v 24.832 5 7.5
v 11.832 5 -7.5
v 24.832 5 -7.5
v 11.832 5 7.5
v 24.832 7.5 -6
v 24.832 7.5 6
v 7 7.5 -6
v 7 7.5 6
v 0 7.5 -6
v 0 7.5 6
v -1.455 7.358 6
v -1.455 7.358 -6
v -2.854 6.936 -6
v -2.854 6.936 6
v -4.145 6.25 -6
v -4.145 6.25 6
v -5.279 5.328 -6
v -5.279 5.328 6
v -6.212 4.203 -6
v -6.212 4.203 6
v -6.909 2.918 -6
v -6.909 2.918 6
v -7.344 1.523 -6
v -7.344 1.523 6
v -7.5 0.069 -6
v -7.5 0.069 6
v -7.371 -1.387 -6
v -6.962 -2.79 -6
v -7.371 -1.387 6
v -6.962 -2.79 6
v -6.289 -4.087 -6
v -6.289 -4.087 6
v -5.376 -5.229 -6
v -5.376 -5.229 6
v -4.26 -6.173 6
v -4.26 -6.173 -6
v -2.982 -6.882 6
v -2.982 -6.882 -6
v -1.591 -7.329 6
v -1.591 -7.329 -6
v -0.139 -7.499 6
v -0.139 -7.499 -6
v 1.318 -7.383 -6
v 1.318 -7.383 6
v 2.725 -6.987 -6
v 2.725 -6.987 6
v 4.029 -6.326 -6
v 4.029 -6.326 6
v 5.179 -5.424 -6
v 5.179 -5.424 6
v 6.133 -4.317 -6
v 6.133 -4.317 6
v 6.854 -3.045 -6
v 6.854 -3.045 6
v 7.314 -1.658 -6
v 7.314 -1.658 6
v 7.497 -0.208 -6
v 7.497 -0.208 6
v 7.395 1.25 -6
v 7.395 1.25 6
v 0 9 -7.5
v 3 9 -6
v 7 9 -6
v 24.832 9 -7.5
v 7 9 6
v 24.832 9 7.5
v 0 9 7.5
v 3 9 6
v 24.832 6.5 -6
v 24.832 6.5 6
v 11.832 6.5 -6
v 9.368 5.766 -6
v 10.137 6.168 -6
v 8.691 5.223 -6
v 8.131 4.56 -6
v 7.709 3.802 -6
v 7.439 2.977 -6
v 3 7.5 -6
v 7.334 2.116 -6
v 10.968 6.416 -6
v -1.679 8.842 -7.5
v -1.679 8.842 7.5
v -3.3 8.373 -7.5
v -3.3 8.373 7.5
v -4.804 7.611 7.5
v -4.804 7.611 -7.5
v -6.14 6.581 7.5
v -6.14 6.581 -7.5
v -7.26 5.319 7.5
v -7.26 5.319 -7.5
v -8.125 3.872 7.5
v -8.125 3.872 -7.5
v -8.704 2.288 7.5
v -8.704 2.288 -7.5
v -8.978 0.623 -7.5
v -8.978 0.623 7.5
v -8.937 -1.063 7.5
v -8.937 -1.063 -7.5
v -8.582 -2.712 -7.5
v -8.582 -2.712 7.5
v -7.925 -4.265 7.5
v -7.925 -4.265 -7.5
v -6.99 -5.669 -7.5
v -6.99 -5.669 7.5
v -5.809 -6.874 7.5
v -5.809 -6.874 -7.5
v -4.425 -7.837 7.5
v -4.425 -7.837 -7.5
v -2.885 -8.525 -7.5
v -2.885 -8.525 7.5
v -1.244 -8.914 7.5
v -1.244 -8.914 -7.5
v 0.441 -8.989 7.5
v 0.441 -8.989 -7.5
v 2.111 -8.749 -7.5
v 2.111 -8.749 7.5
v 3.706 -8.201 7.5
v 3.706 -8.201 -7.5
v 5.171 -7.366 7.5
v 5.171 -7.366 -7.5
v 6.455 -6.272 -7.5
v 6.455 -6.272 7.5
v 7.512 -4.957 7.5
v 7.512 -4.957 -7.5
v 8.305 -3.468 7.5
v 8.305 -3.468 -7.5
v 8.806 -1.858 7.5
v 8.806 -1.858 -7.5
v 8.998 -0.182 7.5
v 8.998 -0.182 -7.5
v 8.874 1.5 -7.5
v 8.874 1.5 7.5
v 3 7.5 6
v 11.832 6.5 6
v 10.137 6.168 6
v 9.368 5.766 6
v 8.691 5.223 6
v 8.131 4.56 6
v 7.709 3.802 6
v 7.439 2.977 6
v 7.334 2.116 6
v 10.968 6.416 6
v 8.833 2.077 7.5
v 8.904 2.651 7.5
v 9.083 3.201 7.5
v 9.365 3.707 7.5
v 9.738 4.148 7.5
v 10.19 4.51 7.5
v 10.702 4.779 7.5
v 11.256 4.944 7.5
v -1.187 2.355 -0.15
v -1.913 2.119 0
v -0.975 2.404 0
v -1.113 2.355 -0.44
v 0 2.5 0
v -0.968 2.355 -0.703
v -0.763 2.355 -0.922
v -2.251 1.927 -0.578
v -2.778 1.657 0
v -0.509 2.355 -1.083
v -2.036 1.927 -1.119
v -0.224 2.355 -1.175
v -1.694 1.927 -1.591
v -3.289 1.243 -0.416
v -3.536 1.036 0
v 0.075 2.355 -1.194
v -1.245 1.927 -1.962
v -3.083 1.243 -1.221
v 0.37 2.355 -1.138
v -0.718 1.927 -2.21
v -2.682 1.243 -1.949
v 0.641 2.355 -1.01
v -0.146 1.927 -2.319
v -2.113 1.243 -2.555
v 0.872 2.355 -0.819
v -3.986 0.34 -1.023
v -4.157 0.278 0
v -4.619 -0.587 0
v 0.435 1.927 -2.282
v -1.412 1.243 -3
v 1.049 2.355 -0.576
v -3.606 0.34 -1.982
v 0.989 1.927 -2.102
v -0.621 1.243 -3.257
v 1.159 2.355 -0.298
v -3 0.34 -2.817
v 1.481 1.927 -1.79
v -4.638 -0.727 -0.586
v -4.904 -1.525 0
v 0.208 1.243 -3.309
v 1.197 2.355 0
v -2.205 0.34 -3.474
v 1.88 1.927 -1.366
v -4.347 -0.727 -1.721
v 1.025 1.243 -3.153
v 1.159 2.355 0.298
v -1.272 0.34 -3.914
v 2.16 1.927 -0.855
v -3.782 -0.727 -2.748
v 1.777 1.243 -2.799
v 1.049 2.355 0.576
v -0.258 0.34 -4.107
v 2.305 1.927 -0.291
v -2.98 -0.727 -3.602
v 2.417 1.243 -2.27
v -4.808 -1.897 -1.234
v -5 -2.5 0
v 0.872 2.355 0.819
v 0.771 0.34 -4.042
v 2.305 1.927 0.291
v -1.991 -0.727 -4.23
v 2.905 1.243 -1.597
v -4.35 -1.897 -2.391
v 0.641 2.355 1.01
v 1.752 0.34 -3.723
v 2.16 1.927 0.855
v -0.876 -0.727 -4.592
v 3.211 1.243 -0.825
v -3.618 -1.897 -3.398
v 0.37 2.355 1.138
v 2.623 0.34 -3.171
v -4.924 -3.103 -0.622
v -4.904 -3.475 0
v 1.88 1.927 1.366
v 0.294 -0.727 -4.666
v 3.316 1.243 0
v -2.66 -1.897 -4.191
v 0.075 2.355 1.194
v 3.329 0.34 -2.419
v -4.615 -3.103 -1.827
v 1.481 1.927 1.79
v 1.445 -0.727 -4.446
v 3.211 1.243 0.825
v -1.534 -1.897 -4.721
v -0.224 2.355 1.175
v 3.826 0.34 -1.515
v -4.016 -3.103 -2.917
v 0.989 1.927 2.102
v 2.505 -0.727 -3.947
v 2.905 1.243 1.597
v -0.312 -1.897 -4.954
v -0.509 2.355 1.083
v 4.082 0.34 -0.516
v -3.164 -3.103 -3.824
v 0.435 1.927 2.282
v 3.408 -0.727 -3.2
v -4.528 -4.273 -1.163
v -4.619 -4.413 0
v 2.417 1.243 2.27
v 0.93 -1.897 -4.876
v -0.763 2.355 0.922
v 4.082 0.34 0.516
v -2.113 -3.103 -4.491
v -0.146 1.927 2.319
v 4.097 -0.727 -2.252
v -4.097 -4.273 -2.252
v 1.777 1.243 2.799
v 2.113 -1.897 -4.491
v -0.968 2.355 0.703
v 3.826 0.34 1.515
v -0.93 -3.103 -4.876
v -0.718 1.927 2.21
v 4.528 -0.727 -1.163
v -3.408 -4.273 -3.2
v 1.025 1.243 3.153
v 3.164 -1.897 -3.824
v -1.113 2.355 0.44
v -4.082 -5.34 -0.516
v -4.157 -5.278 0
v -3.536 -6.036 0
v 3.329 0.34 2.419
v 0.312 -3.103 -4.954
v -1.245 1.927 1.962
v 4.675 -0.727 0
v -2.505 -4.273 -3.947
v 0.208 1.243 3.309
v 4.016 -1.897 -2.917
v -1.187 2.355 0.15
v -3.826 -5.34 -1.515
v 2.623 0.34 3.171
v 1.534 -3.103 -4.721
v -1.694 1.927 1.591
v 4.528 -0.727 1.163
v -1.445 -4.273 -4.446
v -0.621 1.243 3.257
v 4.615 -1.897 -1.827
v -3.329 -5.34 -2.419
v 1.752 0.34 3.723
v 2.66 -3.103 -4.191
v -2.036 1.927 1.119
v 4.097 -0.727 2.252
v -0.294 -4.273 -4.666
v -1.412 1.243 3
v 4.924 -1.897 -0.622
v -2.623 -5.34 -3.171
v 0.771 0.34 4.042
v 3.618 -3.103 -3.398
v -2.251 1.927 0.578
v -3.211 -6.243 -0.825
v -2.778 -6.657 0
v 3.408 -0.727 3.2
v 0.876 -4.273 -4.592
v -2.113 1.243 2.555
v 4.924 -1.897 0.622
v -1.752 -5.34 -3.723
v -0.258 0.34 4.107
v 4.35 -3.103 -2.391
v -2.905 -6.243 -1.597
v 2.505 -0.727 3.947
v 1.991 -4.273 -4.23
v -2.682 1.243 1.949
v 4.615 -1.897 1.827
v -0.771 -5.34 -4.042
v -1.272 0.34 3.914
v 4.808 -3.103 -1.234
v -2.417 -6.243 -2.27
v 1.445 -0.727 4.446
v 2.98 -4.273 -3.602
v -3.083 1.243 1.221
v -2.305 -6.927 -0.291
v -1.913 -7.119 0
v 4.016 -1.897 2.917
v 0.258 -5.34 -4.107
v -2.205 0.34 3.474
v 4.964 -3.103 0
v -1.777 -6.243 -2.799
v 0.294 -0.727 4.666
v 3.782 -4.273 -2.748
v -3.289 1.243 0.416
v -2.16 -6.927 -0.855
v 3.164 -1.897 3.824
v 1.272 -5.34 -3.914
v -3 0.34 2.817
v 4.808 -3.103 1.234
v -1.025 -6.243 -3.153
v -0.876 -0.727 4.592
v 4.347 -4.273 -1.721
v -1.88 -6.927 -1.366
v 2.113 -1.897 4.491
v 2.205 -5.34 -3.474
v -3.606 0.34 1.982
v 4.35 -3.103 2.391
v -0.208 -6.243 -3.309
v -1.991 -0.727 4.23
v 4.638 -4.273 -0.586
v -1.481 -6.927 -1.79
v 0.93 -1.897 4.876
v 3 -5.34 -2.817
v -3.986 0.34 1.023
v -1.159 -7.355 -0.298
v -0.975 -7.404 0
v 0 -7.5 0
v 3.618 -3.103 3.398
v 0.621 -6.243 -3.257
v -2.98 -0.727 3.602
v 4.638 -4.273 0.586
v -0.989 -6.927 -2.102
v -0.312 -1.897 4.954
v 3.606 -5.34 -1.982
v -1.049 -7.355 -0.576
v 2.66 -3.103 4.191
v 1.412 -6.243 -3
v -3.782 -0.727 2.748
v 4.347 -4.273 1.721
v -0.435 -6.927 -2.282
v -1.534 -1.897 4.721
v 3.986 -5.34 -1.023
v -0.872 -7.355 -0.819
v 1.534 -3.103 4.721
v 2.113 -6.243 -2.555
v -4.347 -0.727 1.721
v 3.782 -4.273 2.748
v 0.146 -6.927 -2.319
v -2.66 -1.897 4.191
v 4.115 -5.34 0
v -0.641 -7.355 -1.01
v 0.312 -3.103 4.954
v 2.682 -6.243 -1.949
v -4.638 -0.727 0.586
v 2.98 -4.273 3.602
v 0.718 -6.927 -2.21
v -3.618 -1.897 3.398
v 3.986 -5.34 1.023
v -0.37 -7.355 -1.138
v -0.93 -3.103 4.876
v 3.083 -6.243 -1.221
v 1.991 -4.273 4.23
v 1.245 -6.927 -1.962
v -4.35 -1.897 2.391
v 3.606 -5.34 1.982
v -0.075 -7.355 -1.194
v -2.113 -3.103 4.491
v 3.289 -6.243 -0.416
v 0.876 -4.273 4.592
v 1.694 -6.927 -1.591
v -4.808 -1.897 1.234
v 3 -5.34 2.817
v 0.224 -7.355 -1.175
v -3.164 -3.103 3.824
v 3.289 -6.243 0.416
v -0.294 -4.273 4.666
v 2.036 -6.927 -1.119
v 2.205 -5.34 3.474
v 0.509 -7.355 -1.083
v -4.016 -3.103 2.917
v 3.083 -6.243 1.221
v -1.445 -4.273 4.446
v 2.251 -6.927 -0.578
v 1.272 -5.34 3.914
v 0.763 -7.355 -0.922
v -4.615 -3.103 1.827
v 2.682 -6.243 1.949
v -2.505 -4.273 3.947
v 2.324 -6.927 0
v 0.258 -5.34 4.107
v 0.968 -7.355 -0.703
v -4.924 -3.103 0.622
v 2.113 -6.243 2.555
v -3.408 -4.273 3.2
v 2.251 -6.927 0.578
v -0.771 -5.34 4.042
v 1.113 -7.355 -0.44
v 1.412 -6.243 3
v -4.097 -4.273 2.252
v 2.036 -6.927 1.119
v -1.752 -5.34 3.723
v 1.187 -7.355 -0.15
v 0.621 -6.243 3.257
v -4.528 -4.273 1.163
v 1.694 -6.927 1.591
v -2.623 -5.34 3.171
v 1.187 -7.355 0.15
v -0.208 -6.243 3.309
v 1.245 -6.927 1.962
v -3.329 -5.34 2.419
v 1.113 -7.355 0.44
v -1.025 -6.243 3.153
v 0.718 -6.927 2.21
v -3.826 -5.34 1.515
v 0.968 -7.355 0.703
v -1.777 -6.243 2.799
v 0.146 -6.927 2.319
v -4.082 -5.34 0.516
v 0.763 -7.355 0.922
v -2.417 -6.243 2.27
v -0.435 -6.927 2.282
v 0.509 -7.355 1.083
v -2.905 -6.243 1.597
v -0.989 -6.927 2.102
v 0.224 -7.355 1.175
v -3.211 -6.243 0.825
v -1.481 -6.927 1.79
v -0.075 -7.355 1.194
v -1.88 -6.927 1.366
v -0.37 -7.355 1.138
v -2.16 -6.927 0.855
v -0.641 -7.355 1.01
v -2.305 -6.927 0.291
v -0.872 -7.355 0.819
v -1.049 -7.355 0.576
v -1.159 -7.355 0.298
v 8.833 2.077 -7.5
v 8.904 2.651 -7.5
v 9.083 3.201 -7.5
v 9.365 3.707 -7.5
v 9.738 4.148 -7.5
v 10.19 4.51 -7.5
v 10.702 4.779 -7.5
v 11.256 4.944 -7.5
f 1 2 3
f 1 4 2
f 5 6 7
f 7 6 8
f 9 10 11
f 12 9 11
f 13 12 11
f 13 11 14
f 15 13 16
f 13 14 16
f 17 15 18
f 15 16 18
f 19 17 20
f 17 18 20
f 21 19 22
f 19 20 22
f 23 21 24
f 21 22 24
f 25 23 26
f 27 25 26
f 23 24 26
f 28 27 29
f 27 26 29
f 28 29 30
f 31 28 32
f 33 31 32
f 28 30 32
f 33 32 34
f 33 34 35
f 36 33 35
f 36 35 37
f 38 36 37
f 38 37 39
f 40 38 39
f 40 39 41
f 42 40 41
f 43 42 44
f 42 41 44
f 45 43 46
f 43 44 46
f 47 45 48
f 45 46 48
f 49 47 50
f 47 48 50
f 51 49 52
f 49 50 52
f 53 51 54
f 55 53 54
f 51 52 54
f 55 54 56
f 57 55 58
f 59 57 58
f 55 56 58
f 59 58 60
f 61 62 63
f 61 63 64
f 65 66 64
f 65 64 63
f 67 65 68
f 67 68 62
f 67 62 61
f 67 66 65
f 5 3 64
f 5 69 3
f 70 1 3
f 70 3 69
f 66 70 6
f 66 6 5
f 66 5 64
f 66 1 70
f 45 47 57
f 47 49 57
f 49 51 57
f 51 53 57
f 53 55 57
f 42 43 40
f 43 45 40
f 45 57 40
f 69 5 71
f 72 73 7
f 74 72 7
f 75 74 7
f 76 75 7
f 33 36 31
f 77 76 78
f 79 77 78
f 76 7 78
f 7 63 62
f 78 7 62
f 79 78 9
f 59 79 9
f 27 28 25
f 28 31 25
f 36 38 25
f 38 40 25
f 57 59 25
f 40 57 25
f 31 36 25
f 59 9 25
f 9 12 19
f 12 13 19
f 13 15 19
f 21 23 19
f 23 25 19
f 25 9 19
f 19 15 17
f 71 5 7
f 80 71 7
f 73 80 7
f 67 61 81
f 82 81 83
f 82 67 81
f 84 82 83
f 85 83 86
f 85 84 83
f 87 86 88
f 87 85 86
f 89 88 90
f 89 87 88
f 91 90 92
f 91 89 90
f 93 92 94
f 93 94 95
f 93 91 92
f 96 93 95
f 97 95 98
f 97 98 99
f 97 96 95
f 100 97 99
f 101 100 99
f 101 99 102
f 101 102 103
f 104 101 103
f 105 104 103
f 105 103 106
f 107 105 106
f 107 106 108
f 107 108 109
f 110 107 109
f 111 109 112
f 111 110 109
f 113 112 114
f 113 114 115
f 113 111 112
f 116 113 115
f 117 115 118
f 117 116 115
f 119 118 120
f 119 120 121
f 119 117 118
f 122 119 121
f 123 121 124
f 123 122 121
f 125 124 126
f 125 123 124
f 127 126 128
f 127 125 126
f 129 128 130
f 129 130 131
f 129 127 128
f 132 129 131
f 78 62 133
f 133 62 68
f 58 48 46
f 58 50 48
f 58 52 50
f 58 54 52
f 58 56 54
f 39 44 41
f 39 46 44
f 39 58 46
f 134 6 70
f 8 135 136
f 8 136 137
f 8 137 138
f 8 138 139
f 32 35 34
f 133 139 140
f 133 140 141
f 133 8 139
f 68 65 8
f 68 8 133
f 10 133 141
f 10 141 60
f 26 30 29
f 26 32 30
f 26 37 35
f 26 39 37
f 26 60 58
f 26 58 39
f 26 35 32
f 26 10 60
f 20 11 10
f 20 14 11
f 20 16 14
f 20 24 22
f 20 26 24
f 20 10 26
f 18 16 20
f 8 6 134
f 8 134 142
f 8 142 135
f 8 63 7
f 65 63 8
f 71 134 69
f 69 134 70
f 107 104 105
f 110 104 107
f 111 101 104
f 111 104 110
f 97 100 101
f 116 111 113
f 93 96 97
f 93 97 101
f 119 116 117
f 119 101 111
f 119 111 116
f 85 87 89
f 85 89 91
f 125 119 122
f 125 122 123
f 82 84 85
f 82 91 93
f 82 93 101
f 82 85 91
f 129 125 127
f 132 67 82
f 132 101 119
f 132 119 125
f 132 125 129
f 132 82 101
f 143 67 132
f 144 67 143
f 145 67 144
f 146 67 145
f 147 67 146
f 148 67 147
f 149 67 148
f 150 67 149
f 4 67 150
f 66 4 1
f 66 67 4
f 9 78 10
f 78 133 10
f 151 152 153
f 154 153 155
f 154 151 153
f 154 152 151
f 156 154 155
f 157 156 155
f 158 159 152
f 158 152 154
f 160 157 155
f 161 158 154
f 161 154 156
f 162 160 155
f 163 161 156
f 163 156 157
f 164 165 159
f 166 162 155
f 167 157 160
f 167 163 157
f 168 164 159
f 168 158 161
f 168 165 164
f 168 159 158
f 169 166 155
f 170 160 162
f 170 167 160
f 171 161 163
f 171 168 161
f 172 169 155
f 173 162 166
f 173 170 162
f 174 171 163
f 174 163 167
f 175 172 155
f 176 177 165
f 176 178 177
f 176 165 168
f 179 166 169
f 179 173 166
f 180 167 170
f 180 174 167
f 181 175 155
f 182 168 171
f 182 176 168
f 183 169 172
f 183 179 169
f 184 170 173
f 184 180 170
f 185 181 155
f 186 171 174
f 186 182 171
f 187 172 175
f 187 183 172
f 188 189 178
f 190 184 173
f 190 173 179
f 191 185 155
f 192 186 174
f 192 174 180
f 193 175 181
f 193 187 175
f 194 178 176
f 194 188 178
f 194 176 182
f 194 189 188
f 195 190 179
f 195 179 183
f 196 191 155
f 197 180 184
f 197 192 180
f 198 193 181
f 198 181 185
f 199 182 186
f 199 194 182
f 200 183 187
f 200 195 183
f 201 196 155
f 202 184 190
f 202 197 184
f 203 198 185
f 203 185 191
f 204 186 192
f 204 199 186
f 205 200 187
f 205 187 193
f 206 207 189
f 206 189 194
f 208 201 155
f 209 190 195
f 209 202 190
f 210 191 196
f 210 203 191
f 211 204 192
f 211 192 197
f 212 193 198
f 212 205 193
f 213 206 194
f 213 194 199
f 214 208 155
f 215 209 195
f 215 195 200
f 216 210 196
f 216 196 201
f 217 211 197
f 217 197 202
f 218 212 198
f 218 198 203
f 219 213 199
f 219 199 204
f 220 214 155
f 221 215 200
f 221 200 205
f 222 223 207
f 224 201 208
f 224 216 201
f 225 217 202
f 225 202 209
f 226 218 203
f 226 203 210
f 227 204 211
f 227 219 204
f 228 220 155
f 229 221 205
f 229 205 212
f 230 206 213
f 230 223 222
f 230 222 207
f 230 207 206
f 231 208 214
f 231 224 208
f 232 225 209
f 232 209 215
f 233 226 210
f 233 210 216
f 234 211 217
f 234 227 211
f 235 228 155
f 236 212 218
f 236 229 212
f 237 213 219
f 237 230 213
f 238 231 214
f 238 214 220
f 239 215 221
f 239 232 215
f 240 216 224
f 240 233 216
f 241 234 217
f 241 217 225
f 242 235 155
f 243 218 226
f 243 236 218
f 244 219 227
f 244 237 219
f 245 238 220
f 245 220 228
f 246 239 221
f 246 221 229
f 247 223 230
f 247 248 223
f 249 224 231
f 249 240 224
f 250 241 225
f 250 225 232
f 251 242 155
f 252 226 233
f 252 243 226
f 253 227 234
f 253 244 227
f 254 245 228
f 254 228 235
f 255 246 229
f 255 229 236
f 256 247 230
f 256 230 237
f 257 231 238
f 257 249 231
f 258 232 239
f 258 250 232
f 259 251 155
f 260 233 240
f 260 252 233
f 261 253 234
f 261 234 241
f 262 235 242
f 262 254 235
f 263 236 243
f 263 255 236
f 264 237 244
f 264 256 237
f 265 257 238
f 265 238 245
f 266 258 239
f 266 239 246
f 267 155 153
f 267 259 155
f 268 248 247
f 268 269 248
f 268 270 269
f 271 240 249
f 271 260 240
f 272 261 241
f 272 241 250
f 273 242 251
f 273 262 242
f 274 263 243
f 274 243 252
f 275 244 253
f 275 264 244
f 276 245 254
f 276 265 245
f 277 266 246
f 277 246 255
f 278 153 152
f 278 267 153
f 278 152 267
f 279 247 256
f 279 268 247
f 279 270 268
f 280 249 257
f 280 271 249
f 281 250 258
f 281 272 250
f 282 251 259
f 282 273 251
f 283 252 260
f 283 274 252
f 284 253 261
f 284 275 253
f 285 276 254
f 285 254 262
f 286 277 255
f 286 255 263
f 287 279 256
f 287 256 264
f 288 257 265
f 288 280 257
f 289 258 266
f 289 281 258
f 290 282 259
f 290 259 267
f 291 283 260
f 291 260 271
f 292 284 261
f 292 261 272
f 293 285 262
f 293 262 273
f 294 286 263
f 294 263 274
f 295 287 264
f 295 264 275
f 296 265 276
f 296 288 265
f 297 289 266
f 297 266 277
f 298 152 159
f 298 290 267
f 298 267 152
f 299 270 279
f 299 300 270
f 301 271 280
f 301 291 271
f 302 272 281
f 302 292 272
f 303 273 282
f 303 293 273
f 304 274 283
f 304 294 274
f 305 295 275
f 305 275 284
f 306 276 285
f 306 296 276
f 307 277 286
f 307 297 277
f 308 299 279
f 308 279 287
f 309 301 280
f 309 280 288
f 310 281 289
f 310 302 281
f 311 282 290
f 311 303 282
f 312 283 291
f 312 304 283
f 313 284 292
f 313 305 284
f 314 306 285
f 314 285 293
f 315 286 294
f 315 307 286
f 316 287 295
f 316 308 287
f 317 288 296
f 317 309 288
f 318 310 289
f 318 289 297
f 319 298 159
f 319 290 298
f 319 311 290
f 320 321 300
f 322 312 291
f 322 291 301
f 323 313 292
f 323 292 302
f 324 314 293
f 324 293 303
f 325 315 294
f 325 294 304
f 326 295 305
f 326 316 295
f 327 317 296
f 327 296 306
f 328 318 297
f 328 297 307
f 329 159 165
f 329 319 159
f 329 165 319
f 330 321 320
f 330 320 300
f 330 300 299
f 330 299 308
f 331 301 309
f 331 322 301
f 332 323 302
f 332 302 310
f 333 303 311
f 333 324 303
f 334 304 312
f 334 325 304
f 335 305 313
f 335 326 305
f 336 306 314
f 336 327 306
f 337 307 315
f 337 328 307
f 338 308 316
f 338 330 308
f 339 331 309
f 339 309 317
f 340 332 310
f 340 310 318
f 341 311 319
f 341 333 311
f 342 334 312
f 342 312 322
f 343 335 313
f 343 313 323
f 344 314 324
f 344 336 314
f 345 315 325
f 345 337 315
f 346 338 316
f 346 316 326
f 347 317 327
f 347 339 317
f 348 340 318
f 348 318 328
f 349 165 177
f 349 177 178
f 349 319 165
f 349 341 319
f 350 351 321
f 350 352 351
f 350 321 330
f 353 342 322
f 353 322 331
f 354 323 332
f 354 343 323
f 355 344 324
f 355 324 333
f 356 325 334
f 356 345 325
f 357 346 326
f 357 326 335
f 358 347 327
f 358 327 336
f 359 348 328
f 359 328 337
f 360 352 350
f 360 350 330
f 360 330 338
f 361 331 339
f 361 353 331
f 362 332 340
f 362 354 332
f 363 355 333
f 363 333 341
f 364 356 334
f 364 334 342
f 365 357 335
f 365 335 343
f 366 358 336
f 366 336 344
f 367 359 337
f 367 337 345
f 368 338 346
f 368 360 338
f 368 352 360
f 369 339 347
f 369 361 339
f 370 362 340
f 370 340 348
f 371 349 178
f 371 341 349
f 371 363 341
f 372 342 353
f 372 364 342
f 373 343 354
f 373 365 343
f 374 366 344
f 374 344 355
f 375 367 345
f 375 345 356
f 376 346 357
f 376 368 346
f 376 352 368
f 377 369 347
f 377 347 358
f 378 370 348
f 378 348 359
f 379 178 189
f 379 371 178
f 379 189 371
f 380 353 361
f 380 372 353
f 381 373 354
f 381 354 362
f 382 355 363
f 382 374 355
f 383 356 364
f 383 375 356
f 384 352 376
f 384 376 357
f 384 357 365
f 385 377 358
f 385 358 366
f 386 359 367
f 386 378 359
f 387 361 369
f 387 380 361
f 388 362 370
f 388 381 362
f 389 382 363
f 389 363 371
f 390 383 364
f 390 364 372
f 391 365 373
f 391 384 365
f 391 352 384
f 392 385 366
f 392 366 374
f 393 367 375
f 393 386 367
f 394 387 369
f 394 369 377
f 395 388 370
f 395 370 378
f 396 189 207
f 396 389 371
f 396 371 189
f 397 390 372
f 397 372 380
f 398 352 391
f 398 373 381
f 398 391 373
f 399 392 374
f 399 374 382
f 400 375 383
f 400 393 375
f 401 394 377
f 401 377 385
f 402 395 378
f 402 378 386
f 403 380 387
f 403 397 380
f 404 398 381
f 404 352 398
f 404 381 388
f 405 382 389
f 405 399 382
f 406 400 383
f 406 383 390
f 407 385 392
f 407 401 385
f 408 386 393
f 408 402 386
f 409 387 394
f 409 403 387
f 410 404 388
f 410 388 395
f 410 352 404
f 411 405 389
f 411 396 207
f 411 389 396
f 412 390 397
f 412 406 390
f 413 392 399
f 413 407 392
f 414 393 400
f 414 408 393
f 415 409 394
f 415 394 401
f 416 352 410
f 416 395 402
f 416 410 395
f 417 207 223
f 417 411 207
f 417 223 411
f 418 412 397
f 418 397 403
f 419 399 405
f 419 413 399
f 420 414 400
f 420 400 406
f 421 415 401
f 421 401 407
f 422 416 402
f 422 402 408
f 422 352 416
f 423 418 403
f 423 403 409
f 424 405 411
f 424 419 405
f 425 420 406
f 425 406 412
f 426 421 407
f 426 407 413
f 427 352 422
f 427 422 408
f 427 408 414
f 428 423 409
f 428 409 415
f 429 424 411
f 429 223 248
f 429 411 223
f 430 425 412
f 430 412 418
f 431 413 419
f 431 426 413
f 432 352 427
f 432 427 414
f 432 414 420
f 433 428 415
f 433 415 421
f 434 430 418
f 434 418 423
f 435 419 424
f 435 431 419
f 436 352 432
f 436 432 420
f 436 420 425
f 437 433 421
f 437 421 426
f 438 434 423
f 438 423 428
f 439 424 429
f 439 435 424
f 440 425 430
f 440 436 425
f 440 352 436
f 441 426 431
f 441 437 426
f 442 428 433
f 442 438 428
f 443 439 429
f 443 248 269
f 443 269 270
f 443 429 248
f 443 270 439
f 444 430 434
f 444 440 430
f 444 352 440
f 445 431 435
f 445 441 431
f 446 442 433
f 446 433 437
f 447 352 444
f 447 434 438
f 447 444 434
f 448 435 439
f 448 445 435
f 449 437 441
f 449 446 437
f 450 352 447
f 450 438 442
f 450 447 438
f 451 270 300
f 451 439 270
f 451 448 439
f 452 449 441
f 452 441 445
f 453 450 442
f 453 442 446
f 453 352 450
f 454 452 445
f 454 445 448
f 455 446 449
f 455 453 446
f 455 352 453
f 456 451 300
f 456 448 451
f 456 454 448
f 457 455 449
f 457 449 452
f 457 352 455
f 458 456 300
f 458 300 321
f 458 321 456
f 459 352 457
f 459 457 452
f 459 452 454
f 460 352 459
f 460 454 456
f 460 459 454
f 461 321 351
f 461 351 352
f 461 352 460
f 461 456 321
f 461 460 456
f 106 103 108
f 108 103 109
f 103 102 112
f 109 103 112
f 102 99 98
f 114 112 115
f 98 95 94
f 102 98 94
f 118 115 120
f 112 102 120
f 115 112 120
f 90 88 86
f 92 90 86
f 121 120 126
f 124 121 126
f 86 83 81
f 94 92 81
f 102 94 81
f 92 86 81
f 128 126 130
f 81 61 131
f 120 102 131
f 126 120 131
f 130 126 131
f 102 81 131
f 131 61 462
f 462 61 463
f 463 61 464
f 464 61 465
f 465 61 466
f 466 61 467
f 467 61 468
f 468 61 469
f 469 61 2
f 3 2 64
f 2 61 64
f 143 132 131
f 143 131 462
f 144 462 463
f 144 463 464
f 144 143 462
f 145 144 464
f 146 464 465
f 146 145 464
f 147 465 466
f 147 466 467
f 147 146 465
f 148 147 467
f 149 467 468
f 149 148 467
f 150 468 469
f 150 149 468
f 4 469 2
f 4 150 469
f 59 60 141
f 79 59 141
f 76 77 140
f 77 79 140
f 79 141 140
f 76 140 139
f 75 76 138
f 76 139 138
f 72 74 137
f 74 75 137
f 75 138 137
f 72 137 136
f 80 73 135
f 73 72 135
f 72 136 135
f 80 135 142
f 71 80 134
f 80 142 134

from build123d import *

# Parameters (mm, degrees)
F1_DEPTH = 7.5
F2_T     = -1.5
F3_W     = 4
F3_H     = 12
F4_DEPTH = 1.5


with BuildPart() as f1:
    # F0 (on Top) → F1 (new body, symmetric)
    with BuildSketch(Plane.XY):
        with BuildLine():
            Line((24.83216, 9), (0, 9))
            ThreePointArc((0, 9), (-5.809475, -6.873864), (8.87412, 1.5))
            ThreePointArc((8.87412, 1.5), (9.540872, 3.936492), (11.83216, 5))
            Line((11.83216, 5), (24.83216, 5))
            Line((24.83216, 5), (24.83216, 9))
        make_face()
    extrude(amount=F1_DEPTH, both=True)

    # F2
    f2_openings = [f1.faces().sort_by_distance(p)[0] for p in [
        (24.83216, 7, 0),
    ]]
    offset(amount=F2_T, openings=f2_openings)

    # F3 (on face) → F4 (cut)
    with BuildSketch(Plane(origin=(0, 9, 0), x_dir=(-1, 0, 0), z_dir=(0, 1, 0))):
        with Locations((-5, 0)):
            Rectangle(F3_W, F3_H)
    extrude(amount=-F4_DEPTH, mode=Mode.SUBTRACT)


with BuildPart() as f6:
    # F5 (on Top) → F6 (revolve)
    with BuildSketch(Plane.XY):
        with BuildLine():
            ThreePointArc((0, 2.5), (-5, -2.5), (0, -7.5))
            Line((0, -7.5), (0, 2.5))
        make_face()
    revolve(axis=Axis((0, -2.5, 0), (0, -1, 0)))


solid = Compound([f1.part, f6.part])
